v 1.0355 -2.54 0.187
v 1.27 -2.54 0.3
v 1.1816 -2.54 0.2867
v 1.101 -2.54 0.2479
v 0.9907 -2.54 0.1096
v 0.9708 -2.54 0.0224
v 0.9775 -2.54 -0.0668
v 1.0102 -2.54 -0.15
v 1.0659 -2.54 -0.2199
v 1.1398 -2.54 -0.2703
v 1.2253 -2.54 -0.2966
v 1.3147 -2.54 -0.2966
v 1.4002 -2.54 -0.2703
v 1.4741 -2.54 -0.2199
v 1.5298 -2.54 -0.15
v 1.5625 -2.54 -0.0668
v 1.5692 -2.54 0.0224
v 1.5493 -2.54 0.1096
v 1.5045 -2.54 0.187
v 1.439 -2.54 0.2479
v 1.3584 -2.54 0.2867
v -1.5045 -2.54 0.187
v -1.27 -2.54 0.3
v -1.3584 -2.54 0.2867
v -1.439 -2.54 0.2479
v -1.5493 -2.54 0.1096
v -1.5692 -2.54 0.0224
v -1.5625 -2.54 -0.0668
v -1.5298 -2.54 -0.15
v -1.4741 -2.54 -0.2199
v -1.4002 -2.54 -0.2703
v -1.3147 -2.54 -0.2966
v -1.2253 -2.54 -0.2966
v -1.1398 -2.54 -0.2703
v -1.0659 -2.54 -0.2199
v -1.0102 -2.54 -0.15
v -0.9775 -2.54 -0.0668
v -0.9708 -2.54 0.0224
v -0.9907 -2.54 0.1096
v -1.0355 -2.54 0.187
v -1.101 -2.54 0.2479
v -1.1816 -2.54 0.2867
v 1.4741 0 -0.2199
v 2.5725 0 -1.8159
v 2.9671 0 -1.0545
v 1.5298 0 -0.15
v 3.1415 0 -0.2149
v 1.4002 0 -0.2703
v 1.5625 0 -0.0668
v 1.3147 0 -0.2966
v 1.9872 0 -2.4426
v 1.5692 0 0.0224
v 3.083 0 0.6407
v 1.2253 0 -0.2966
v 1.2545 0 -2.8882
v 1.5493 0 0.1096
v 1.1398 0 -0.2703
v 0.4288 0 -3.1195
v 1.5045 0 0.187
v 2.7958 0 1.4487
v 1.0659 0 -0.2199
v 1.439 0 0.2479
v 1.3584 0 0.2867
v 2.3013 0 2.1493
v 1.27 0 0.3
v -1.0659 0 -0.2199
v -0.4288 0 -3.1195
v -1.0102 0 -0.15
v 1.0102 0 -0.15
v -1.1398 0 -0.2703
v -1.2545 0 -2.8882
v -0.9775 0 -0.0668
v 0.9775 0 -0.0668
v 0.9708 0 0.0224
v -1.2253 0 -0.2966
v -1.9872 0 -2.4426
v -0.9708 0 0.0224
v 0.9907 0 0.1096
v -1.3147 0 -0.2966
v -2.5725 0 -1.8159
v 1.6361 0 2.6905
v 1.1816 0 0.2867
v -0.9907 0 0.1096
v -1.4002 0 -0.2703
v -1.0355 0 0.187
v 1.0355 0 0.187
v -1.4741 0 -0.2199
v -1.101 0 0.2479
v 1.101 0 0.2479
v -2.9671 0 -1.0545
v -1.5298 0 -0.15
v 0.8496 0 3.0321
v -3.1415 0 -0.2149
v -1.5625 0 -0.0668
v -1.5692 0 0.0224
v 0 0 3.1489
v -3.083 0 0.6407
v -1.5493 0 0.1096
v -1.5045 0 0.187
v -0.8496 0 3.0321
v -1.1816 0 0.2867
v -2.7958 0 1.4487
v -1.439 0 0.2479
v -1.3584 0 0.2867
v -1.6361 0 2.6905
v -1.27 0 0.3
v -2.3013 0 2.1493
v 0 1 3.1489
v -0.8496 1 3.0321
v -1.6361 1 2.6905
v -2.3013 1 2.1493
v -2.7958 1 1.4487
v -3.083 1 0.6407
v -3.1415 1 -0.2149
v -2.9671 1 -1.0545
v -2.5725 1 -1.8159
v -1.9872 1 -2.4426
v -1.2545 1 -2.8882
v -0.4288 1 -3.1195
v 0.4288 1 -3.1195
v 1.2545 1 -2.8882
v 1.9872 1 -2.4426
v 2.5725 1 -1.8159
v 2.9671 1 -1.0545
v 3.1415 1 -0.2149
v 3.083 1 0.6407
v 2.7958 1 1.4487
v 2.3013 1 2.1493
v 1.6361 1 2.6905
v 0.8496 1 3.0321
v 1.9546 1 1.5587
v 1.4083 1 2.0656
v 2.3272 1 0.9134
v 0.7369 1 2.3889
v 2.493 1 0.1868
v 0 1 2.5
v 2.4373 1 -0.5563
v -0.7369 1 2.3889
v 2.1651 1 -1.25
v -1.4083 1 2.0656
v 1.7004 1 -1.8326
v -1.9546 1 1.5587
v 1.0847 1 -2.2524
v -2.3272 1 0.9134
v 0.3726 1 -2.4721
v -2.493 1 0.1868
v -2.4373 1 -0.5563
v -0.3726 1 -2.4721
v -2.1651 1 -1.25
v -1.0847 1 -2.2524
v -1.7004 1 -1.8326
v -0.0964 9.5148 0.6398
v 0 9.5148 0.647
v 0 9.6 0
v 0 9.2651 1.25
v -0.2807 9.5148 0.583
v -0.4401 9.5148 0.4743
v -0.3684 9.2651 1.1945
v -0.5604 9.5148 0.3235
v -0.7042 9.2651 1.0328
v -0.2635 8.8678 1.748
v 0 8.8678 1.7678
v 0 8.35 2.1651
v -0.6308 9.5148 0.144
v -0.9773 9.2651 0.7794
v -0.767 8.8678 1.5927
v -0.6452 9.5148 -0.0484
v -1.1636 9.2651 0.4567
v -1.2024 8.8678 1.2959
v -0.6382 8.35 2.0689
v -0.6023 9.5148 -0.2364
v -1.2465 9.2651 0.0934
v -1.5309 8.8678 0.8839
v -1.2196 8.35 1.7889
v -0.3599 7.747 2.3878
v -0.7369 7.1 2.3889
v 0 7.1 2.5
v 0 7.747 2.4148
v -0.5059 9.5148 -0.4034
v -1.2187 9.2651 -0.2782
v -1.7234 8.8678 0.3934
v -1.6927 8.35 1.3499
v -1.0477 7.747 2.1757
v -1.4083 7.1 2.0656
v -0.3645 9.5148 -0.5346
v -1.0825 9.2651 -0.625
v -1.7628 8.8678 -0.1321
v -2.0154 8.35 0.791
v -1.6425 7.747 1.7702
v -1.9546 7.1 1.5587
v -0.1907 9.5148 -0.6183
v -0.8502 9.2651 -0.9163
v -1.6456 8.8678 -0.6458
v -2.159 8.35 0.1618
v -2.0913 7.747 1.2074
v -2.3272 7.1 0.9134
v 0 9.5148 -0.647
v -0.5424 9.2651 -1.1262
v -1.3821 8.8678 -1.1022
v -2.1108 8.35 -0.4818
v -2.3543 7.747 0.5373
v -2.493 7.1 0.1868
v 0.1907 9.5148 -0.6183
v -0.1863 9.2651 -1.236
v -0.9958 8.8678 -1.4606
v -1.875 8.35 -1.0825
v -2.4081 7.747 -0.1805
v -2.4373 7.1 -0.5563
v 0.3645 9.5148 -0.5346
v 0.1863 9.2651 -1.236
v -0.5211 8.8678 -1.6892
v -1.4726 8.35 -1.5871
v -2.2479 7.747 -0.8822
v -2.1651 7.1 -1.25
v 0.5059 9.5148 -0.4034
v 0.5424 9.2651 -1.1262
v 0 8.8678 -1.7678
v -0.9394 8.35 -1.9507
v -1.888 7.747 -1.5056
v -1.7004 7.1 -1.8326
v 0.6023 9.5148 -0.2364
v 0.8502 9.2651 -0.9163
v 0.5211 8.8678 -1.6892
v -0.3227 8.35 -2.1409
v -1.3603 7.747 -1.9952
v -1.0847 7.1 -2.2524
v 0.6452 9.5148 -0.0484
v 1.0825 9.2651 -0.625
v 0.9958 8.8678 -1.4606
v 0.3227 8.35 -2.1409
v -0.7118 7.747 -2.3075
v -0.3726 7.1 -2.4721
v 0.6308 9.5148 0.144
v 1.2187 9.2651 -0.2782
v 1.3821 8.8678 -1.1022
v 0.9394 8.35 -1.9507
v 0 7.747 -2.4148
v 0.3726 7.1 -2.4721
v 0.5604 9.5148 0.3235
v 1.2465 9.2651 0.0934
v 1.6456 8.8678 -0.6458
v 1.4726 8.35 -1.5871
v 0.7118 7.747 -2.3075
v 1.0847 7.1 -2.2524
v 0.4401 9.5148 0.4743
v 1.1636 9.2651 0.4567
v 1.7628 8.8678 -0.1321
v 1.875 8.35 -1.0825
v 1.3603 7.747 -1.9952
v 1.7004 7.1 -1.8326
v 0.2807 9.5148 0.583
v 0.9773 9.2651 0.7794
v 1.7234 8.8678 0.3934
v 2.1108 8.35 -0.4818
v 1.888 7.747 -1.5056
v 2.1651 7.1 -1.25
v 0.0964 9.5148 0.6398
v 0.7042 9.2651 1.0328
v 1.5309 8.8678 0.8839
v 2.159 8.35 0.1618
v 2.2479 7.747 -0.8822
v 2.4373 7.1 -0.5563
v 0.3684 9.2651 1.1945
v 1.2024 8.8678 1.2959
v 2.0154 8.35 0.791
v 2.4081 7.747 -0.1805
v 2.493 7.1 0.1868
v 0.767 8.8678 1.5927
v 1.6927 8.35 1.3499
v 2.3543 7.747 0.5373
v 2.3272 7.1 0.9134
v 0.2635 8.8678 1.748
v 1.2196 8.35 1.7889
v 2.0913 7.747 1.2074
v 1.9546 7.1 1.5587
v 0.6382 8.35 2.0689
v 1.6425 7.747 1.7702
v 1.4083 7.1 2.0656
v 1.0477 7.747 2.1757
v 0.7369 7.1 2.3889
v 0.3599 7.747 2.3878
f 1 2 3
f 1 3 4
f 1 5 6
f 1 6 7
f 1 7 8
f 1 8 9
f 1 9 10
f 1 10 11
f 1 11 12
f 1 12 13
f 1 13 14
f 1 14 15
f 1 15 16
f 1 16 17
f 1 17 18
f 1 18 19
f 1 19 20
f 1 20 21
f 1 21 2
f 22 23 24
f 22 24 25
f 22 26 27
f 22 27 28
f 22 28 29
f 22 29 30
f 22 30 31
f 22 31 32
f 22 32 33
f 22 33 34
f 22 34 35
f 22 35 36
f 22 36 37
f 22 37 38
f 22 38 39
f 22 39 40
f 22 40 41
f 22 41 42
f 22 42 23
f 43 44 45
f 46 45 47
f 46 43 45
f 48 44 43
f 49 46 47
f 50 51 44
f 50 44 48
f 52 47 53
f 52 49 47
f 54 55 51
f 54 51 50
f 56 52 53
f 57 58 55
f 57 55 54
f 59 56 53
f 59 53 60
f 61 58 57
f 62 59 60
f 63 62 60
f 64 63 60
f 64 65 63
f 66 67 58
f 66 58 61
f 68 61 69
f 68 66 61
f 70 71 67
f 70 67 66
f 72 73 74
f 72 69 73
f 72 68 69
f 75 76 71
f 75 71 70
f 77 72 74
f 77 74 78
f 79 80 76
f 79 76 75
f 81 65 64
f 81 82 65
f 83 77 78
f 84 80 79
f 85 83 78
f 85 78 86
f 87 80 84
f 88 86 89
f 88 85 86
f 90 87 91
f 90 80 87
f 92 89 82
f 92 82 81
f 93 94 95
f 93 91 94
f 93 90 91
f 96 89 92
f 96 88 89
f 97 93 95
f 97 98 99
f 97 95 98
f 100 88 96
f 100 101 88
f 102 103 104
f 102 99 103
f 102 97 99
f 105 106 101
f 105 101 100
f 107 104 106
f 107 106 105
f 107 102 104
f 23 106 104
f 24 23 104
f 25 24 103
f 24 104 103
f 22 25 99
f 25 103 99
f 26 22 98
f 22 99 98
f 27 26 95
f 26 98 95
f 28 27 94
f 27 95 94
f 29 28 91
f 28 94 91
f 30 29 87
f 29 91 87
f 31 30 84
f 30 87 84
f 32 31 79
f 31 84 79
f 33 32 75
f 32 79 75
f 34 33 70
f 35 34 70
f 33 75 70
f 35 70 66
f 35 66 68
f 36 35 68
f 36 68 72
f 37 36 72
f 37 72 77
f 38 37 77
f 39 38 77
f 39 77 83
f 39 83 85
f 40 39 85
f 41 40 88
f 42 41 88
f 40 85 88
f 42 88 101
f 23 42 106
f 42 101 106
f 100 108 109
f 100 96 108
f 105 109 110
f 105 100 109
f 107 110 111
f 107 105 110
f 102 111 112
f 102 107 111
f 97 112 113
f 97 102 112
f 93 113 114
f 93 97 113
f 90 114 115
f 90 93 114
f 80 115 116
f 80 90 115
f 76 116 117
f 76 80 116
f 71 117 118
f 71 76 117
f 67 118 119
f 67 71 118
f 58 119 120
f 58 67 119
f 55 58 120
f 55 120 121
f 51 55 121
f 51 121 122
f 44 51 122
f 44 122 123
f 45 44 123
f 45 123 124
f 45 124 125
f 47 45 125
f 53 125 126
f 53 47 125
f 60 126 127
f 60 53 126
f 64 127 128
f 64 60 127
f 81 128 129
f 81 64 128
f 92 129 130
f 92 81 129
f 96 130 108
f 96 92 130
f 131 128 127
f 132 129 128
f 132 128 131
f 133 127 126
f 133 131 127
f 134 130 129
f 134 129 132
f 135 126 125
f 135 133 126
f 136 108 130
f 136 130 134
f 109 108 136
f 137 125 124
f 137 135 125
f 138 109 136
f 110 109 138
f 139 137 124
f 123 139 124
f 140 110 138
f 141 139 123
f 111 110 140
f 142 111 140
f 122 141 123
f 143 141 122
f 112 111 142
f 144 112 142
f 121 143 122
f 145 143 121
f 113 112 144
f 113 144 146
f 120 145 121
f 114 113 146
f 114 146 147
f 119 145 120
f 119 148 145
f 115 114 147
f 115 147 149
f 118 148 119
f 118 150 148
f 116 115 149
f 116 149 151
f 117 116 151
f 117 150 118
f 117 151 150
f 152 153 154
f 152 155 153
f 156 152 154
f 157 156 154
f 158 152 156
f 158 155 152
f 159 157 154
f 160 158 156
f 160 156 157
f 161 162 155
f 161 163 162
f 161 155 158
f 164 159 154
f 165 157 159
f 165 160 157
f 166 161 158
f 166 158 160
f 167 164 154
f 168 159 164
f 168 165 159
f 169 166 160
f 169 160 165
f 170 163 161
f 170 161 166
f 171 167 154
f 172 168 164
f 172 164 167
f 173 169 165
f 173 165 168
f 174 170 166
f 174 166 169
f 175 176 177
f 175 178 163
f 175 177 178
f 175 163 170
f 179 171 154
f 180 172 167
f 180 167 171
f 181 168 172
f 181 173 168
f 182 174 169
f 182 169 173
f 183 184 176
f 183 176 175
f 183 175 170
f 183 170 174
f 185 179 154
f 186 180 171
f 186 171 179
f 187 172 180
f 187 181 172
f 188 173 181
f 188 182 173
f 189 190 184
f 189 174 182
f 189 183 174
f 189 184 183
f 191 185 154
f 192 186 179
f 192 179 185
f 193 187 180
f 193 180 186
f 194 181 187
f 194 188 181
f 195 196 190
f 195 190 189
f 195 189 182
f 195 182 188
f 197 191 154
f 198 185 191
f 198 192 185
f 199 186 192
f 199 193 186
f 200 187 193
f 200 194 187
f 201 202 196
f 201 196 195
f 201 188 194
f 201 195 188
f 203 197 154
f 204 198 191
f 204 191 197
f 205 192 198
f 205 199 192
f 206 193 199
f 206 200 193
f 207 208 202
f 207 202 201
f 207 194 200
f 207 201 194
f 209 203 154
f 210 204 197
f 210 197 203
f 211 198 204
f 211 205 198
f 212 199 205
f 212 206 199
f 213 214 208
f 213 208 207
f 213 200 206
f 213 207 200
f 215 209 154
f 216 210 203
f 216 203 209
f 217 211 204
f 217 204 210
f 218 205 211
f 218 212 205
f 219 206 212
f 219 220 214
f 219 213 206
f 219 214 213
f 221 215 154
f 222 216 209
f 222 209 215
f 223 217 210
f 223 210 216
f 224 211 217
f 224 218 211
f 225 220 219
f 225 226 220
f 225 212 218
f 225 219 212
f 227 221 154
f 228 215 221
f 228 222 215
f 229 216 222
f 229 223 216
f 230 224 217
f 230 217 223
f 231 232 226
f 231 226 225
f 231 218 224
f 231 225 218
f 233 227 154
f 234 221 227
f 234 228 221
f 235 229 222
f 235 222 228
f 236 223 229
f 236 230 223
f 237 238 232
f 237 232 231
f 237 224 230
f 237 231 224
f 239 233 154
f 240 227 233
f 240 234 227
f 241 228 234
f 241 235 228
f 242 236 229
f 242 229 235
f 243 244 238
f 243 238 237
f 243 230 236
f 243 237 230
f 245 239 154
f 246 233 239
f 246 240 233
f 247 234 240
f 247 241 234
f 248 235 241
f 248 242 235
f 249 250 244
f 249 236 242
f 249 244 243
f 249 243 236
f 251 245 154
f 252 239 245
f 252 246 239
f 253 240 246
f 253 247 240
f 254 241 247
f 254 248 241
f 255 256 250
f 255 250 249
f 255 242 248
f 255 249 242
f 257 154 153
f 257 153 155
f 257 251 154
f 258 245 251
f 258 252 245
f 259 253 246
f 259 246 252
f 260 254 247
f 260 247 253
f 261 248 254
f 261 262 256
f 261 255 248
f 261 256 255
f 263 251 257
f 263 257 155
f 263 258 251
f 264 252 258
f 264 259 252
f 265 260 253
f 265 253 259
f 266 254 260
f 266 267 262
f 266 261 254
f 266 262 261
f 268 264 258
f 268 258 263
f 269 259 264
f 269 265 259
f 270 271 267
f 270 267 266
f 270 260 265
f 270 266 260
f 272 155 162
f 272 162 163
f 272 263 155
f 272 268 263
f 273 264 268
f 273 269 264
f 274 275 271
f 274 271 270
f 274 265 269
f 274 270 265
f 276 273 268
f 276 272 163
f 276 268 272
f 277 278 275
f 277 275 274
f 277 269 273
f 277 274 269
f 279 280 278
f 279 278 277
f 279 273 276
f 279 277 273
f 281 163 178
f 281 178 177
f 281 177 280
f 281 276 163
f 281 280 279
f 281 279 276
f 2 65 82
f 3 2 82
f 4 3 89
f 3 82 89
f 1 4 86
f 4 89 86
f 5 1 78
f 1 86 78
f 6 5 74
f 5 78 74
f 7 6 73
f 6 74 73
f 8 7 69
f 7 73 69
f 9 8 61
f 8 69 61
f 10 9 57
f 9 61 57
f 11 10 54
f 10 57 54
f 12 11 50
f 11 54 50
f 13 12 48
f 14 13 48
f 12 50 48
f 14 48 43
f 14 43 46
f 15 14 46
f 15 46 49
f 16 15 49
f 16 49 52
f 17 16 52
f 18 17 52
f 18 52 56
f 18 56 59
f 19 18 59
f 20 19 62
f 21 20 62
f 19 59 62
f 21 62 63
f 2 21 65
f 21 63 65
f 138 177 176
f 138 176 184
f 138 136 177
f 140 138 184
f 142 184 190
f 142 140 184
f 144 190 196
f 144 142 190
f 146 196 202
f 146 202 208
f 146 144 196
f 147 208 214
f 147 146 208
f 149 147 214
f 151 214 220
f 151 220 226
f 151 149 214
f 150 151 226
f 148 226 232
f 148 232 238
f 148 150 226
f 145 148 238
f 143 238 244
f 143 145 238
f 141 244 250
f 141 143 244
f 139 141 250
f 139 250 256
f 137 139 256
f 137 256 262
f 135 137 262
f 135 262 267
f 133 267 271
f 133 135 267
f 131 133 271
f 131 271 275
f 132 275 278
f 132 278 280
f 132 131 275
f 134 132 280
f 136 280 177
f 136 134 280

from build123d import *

# Parameters (mm, degrees)
SKETCH2_R           = 0.3
BOSS_EXTRUDE1_DEPTH = 2.54


with BuildPart() as part:
    # Sketch1 → Revolve1 (revolve)
    with BuildSketch(Plane.XY, mode=Mode.PRIVATE) as revolve1_sk:
        with BuildLine():
            Line((2.5, 7.1), (2.5, 1))
            Line((2.5, 1), (3.148870311, 1))
            Line((3.148870311, 1), (3.148870311, 0))
            Line((3.148870311, 0), (0, 0))
            Line((0, 0), (0, 7.1))
            Line((0, 7.1), (0, 9.6))
            ThreePointArc((0, 9.6), (1.767766953, 8.867766953), (2.5, 7.1))
        make_face()
    revolve(revolve1_sk.sketch.rotate(Axis((0, 7.1, 0), (0, -1, 0)), 90), axis=Axis((0, 7.1, 0), (0, -1, 0)))

    # Sketch2 → Boss-Extrude1 (add)
    with BuildSketch(Plane.XZ):
        with Locations(Location((-1.27, 0, 0), (0, 0, 90))):
            Circle(SKETCH2_R)
        with Locations(Location((1.27, 0, 0), (0, 0, 90))):
            Circle(SKETCH2_R)
    extrude(amount=BOSS_EXTRUDE1_DEPTH)


solid = part.part
